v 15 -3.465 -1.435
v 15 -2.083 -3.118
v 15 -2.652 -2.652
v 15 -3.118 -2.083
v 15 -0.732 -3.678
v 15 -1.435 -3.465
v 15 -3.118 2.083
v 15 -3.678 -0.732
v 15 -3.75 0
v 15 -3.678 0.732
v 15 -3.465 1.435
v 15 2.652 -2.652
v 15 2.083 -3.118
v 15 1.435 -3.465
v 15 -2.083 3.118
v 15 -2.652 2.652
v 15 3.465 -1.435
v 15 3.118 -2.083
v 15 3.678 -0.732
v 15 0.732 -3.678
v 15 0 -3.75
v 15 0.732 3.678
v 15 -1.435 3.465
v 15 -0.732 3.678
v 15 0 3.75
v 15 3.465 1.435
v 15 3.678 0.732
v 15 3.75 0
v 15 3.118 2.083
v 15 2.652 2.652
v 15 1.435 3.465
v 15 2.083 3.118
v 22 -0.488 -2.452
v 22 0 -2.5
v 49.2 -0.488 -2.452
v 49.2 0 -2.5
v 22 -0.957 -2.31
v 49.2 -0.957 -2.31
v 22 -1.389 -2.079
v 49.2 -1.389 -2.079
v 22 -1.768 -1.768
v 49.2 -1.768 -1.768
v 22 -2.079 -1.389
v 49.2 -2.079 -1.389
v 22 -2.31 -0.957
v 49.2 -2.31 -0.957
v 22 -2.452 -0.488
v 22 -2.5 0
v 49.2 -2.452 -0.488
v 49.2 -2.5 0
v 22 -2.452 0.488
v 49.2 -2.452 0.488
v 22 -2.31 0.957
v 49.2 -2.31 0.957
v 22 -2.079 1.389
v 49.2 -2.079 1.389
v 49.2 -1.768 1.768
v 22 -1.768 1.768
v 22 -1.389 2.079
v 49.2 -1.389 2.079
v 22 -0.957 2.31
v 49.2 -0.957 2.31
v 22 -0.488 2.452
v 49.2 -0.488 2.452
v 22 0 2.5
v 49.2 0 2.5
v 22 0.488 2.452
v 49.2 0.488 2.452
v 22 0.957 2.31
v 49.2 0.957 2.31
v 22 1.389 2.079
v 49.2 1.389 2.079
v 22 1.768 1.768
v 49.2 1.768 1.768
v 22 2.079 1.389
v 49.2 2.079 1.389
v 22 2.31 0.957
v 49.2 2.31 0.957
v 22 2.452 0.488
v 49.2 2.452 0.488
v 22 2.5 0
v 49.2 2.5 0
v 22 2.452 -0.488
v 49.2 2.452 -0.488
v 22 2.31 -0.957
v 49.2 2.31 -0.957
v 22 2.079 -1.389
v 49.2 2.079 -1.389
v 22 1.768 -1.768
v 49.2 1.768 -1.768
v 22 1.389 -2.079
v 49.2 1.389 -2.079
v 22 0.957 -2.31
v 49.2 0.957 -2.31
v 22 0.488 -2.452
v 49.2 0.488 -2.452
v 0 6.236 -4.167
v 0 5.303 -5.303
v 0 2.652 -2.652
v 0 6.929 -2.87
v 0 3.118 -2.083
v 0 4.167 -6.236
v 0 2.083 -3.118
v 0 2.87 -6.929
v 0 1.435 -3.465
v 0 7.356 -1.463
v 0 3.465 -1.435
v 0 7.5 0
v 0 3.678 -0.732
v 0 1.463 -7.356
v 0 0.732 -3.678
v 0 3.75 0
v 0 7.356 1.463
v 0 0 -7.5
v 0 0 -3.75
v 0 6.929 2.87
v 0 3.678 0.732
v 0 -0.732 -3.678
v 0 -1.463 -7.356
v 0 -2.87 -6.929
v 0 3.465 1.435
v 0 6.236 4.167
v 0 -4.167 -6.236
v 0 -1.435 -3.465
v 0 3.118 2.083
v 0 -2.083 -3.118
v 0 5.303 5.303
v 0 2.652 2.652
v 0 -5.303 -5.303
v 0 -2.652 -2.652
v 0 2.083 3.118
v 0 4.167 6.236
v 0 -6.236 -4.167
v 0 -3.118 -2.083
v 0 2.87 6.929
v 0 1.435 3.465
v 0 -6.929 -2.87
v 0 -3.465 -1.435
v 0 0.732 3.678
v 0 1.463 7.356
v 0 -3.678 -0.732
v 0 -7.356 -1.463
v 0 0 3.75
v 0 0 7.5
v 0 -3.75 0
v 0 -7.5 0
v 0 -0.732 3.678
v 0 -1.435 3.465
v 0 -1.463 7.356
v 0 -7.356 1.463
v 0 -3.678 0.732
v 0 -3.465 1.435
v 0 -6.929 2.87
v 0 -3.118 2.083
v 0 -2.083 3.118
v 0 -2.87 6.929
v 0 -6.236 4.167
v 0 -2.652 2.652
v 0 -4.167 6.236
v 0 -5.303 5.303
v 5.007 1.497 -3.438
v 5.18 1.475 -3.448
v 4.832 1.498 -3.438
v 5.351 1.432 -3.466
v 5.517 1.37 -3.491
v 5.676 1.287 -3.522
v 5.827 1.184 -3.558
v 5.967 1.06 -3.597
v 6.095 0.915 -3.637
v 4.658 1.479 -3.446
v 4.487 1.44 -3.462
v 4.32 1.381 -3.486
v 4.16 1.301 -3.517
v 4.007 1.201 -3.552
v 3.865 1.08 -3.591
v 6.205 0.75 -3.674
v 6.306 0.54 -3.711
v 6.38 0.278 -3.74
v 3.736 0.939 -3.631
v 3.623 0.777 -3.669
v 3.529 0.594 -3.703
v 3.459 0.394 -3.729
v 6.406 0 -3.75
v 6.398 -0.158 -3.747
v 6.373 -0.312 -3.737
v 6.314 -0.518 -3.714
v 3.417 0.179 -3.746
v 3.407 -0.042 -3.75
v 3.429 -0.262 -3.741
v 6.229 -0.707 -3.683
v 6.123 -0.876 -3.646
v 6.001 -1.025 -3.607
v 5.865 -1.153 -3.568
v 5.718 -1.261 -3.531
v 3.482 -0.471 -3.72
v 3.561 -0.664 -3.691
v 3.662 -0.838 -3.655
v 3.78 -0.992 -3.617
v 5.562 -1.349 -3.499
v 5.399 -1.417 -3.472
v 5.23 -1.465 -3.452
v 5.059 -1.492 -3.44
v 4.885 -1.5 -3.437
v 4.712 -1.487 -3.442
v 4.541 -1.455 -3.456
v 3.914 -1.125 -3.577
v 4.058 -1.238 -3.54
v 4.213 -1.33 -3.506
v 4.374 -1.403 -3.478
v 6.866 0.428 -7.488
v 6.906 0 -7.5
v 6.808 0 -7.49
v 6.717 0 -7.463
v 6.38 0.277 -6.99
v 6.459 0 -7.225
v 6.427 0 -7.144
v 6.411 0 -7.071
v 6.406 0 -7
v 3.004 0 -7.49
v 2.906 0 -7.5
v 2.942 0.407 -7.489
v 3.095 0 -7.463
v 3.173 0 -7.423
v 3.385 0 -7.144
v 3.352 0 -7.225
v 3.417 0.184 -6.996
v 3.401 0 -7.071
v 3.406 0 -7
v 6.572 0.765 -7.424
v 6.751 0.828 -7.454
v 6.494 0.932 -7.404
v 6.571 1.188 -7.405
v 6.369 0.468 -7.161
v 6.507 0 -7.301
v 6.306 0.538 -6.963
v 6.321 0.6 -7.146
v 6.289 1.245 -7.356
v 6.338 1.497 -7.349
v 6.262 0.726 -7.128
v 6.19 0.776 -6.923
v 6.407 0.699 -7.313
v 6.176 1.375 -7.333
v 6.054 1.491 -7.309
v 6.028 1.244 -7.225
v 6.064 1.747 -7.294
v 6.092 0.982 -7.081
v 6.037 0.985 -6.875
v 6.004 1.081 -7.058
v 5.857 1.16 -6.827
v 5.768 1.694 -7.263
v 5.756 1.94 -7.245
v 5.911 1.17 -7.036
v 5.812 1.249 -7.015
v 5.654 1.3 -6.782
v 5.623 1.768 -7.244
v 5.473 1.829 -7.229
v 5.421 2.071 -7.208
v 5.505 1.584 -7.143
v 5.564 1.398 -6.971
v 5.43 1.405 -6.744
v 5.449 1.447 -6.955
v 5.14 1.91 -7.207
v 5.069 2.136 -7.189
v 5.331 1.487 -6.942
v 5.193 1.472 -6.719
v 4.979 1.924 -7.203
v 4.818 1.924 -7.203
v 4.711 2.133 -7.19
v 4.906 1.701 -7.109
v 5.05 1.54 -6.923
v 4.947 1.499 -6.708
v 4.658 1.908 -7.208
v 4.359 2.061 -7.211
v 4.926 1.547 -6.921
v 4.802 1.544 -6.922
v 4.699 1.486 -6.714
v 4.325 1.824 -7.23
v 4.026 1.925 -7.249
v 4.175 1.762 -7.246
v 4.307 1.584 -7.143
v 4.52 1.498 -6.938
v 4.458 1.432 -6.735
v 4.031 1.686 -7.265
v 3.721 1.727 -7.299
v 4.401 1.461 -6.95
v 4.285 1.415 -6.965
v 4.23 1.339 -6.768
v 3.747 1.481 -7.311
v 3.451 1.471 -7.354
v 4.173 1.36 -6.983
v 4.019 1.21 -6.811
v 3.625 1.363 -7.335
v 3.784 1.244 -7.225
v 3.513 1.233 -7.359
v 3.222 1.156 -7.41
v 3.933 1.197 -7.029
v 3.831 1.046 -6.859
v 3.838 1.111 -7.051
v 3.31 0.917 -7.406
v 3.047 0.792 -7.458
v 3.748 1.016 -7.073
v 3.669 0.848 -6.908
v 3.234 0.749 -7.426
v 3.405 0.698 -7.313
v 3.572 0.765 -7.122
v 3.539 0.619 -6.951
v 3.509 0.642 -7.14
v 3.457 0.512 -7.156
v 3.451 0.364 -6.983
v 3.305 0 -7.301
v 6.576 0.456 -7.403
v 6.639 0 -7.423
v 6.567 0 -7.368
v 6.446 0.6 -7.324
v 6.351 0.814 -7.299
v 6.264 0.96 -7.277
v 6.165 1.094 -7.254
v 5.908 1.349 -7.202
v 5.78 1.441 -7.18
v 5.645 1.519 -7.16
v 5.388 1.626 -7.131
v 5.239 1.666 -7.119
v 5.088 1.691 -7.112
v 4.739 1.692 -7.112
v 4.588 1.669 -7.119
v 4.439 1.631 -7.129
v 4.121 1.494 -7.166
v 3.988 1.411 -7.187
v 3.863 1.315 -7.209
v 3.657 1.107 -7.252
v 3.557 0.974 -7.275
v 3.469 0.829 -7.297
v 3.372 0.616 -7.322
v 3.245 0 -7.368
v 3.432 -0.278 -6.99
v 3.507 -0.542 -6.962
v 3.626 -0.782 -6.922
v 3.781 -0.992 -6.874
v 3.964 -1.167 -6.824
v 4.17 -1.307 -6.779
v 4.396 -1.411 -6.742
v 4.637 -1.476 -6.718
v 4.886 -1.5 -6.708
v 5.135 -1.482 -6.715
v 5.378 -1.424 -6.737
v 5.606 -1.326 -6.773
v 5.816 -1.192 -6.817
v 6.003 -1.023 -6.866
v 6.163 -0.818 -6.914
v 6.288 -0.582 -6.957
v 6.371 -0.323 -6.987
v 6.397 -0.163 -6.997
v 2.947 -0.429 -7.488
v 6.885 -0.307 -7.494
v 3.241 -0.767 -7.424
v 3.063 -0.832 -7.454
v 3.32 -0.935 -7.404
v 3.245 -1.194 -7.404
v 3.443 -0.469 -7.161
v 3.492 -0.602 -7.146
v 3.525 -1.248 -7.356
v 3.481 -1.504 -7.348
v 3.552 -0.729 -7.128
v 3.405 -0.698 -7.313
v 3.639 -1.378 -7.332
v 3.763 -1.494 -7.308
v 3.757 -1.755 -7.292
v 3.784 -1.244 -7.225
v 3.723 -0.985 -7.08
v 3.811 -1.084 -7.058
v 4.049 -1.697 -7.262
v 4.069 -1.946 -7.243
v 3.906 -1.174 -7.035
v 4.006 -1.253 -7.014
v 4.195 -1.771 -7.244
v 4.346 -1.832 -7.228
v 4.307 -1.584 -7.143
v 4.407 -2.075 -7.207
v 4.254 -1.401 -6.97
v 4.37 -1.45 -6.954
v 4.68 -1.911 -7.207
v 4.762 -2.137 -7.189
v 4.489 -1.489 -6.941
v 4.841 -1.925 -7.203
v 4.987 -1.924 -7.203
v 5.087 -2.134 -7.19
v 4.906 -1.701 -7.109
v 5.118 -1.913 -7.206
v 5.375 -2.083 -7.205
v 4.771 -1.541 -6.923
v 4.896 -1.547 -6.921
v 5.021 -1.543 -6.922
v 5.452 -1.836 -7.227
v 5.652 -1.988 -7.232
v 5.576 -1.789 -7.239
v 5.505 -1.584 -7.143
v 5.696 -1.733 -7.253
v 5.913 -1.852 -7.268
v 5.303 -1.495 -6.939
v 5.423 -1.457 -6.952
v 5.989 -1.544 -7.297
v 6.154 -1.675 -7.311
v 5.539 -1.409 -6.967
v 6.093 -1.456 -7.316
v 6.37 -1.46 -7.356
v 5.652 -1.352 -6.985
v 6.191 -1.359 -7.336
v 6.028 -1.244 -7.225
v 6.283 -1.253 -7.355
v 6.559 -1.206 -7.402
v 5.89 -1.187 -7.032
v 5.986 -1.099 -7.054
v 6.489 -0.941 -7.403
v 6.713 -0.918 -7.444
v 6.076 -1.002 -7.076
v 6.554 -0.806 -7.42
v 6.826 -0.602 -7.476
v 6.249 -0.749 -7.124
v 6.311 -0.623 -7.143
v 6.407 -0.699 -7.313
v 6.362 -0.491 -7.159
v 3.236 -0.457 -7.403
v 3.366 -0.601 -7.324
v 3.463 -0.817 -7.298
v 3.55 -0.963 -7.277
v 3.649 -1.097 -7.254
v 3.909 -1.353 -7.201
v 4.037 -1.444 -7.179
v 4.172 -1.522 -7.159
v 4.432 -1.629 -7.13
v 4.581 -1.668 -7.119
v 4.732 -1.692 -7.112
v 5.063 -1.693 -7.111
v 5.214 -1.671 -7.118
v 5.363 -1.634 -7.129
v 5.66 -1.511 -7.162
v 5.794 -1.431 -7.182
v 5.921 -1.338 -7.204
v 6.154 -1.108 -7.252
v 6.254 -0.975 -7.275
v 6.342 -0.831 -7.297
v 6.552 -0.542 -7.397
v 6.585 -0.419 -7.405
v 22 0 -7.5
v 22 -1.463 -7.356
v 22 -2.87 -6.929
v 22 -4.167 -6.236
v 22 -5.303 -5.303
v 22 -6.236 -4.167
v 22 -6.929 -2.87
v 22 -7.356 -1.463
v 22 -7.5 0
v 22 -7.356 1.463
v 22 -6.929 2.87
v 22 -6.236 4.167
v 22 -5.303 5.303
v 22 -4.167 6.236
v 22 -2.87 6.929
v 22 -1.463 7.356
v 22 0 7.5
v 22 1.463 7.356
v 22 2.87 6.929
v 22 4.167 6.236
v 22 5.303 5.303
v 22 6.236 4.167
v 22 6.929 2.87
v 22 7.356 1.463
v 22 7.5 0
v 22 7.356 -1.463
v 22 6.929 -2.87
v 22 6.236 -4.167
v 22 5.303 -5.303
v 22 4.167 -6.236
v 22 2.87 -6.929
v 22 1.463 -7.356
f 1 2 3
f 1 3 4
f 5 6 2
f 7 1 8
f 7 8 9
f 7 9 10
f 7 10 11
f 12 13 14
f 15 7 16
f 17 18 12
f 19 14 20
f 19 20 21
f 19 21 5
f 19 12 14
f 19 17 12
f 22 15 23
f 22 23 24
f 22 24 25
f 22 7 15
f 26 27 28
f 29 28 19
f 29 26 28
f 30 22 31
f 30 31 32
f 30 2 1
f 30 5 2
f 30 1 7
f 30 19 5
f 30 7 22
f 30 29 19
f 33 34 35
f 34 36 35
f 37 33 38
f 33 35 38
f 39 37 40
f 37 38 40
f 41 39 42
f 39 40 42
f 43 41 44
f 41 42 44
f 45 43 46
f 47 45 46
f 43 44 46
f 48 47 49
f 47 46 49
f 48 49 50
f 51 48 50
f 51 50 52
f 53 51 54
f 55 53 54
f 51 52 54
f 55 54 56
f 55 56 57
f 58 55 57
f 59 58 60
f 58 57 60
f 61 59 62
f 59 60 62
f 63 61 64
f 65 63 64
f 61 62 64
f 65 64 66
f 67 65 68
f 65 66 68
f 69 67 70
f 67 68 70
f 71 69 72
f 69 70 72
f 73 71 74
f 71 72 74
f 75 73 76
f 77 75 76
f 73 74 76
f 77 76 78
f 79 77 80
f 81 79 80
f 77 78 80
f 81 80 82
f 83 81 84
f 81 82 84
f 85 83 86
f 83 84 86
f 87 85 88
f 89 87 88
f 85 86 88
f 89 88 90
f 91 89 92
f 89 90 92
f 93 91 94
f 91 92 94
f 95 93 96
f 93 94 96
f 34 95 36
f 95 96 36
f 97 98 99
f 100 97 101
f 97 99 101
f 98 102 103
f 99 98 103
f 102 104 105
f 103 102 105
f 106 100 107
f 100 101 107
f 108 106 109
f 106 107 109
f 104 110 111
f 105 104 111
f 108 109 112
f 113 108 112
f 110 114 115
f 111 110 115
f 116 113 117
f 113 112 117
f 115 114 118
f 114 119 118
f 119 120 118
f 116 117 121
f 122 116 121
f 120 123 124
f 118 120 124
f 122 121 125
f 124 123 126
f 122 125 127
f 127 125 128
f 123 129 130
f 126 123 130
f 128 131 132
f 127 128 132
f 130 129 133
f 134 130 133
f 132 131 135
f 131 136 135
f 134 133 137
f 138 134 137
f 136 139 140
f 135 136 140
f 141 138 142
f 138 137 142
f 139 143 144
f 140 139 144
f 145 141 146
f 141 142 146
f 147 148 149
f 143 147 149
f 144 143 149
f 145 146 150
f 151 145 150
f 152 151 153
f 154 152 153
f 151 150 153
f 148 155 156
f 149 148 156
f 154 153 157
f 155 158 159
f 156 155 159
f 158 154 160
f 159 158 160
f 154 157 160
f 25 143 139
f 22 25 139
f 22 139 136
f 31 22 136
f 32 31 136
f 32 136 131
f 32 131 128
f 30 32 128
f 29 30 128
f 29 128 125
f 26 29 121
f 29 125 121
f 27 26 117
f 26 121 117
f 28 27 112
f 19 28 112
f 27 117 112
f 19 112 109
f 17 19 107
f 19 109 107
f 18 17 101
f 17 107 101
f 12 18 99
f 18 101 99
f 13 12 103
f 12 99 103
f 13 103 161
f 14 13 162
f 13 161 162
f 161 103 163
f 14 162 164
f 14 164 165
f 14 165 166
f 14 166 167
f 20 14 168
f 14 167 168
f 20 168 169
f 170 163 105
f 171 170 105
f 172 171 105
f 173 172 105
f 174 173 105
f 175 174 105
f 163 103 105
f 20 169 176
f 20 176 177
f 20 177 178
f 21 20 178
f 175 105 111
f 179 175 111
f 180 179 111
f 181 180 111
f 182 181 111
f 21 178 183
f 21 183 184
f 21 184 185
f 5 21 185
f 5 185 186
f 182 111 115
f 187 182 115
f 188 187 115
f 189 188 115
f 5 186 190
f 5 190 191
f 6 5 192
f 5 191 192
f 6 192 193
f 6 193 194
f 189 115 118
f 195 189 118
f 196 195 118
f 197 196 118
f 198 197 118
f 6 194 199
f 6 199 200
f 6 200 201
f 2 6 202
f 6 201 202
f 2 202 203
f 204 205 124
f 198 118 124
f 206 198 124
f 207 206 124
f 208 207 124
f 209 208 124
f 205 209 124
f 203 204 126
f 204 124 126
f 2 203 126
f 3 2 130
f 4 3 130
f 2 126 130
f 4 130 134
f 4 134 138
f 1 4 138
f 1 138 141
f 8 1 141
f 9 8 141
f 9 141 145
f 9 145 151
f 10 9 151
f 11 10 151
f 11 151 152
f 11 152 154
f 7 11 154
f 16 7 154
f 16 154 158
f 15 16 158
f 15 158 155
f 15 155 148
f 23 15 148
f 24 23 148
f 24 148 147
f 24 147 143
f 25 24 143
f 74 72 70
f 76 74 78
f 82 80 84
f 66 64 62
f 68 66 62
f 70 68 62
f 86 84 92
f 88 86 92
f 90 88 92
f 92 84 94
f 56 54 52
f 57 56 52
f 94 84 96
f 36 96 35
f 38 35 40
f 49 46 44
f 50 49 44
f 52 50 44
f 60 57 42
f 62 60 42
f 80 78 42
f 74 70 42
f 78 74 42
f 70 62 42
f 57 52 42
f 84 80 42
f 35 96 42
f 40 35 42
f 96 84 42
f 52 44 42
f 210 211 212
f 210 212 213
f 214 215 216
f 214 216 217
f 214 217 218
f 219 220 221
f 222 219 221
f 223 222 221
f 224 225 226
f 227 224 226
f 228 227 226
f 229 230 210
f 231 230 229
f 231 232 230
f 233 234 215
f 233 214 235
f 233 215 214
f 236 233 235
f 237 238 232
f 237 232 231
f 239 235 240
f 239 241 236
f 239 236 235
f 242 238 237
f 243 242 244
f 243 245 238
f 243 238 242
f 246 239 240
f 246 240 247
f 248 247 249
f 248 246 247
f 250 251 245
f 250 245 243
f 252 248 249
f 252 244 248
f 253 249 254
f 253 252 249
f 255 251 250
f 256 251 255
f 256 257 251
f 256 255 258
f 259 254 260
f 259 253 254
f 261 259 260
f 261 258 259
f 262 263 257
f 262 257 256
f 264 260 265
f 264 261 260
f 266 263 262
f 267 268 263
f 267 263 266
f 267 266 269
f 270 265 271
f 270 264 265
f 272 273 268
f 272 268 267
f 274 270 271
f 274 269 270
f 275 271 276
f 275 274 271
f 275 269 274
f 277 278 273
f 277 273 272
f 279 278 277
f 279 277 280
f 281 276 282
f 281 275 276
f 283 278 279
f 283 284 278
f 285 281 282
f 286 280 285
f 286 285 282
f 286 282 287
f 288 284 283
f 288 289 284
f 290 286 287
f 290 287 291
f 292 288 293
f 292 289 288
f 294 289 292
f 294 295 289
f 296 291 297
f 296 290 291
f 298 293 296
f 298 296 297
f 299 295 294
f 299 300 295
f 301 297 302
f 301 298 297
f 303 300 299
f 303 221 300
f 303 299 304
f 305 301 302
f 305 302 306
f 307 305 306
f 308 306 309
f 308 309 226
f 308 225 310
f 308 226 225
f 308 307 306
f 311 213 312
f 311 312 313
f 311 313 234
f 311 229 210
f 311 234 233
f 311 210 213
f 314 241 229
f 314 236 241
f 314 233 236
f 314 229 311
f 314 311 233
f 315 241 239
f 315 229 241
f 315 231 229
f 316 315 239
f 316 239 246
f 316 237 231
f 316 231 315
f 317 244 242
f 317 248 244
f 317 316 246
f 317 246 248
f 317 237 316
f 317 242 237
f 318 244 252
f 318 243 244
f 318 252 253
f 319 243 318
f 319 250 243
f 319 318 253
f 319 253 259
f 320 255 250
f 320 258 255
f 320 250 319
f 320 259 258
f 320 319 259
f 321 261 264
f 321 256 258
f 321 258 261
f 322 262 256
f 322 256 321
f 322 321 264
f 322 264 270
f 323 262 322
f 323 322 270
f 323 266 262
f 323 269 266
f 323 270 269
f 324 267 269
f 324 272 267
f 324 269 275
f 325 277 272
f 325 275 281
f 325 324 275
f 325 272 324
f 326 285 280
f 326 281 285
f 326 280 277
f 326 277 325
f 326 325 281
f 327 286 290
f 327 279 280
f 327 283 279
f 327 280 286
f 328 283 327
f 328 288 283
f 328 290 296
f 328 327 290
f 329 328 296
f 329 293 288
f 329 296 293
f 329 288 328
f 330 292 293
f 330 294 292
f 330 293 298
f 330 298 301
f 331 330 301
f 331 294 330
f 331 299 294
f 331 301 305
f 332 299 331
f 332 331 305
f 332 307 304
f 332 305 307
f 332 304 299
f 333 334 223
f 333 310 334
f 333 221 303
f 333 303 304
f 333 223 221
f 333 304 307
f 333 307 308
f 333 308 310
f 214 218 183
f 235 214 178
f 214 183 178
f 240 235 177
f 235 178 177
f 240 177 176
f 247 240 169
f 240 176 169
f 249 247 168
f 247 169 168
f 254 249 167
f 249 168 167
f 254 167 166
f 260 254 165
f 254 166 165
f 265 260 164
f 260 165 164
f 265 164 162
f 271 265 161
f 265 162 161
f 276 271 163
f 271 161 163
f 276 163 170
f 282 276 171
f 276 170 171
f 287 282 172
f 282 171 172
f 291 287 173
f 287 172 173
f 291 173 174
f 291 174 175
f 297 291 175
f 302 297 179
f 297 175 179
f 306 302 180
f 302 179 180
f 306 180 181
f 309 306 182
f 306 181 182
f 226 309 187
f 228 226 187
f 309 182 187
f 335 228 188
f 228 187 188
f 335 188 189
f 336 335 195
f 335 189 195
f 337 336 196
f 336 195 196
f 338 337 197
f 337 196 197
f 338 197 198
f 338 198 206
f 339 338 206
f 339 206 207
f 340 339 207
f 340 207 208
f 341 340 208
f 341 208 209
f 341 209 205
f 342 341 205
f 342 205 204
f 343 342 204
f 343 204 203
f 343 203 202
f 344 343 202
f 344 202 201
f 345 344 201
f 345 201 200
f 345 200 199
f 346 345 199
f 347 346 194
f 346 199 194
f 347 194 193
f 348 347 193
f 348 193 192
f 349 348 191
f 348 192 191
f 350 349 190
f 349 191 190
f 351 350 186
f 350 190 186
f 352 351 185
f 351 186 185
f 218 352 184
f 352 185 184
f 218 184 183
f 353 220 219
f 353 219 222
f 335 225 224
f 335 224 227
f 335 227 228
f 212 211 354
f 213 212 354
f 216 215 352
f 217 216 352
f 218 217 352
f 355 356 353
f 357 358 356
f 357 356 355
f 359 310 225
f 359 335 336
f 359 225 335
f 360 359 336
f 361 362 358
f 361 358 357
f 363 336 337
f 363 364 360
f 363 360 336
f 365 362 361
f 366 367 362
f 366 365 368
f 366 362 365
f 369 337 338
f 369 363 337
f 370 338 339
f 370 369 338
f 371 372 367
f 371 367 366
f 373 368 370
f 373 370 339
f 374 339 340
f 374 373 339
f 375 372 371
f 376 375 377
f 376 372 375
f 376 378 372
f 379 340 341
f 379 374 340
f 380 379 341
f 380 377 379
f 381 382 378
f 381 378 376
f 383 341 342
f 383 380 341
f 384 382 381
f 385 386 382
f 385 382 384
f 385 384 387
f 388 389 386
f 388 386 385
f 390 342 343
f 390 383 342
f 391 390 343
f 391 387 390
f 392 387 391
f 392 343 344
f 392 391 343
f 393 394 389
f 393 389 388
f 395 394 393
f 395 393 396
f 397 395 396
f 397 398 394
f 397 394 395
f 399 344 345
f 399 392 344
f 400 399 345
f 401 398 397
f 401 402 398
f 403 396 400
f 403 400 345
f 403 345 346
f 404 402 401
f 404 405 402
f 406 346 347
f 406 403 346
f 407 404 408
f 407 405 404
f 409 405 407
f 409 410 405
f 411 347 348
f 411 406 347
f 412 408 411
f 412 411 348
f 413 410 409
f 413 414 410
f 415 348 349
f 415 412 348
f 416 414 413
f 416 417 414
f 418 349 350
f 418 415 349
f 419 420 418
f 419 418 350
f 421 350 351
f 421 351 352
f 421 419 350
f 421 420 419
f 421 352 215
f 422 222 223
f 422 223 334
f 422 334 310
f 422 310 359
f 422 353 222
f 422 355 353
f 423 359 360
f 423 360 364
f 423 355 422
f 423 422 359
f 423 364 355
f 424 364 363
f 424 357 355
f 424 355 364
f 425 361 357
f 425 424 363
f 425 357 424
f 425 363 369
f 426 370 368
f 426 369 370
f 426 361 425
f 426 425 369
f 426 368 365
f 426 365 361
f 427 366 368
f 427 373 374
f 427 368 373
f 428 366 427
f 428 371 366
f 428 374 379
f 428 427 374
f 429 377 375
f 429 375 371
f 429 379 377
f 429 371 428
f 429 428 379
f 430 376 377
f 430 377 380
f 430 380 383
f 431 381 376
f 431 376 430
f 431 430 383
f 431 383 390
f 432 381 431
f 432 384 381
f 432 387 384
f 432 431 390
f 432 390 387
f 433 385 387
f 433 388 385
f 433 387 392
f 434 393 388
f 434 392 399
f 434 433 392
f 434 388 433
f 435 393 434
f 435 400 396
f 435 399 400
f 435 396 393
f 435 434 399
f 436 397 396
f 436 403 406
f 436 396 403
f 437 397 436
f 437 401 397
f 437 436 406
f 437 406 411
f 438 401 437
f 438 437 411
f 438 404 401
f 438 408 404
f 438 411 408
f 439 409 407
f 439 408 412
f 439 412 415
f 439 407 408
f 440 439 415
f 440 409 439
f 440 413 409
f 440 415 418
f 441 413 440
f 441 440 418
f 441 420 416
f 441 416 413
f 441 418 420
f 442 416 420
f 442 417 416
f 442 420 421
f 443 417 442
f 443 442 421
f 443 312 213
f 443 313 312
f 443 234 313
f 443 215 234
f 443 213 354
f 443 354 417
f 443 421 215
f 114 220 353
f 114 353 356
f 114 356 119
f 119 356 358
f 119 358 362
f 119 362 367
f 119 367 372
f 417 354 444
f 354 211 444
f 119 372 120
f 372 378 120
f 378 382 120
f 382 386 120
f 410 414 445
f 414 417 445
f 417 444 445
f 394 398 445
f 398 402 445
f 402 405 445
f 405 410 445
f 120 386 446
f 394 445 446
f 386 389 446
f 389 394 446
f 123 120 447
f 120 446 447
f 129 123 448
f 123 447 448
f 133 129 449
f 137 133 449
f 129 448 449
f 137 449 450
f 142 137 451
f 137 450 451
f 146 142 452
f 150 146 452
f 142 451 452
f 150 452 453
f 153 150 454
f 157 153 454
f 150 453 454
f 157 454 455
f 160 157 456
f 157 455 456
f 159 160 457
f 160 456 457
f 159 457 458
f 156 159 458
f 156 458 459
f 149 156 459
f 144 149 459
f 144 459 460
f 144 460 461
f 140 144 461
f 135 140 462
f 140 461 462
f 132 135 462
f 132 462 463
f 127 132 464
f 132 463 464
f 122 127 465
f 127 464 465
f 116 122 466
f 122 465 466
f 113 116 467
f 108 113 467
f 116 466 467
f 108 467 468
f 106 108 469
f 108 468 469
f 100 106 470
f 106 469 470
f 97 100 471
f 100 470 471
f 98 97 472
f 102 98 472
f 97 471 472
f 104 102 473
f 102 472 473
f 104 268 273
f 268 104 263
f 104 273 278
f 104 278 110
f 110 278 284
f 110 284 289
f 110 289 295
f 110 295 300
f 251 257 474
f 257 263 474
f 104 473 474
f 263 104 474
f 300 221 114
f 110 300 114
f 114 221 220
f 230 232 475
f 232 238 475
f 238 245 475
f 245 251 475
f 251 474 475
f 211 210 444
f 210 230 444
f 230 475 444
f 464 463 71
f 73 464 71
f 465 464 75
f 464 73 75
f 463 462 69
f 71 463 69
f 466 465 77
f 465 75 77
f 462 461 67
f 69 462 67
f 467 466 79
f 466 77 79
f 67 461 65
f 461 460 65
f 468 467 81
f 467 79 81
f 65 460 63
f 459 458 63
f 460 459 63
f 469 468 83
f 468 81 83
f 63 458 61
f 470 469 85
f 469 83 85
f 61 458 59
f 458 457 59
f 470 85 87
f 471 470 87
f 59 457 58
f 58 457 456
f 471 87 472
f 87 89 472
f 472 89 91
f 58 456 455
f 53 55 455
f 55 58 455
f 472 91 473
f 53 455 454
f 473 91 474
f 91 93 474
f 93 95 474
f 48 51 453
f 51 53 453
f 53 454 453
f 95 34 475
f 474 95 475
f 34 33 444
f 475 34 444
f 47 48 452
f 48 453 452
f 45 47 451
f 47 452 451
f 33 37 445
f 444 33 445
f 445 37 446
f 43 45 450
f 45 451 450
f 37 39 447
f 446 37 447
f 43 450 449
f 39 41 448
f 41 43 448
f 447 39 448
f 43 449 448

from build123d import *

# Parameters (mm, degrees)
SKETCH2_R          = 3.75
CUT_EXTRUDE1_DEPTH = 15
SKETCH3_R          = 1.5
CUT_EXTRUDE2_DEPTH = 10
FILLET1_R          = 0.5


with BuildPart() as part:
    # Sketch1 → Revolve1 (revolve)
    with BuildSketch(Plane(origin=(0, 0, 0), x_dir=(1, 0, 0), z_dir=(0, 1, 0))):
        Polygon((0, 0), (0, 7.5), (22, 7.5), (22, 2.5), (49.2, 2.5), (49.2, 0), align=None)
    revolve(axis=Axis((49.2, 0, 0), (-1, 0, 0)))

    # Sketch2 → Cut-Extrude1 (cut)
    with BuildSketch(Plane.ZY):
        Circle(SKETCH2_R)
    extrude(amount=-CUT_EXTRUDE1_DEPTH, mode=Mode.SUBTRACT)

    # Sketch3 → Cut-Extrude2 (cut)
    with BuildSketch(Plane.XY):
        with Locations((4.905983841, 0)):
            Circle(SKETCH3_R)
    extrude(amount=-CUT_EXTRUDE2_DEPTH, mode=Mode.SUBTRACT)

    # Fillet1
    fillet1_edges = [part.edges().sort_by_distance(p)[0] for p in [
        (4.905983841, 1.5, -7.348469228),
    ]]
    fillet(fillet1_edges, radius=FILLET1_R)


solid = part.part
